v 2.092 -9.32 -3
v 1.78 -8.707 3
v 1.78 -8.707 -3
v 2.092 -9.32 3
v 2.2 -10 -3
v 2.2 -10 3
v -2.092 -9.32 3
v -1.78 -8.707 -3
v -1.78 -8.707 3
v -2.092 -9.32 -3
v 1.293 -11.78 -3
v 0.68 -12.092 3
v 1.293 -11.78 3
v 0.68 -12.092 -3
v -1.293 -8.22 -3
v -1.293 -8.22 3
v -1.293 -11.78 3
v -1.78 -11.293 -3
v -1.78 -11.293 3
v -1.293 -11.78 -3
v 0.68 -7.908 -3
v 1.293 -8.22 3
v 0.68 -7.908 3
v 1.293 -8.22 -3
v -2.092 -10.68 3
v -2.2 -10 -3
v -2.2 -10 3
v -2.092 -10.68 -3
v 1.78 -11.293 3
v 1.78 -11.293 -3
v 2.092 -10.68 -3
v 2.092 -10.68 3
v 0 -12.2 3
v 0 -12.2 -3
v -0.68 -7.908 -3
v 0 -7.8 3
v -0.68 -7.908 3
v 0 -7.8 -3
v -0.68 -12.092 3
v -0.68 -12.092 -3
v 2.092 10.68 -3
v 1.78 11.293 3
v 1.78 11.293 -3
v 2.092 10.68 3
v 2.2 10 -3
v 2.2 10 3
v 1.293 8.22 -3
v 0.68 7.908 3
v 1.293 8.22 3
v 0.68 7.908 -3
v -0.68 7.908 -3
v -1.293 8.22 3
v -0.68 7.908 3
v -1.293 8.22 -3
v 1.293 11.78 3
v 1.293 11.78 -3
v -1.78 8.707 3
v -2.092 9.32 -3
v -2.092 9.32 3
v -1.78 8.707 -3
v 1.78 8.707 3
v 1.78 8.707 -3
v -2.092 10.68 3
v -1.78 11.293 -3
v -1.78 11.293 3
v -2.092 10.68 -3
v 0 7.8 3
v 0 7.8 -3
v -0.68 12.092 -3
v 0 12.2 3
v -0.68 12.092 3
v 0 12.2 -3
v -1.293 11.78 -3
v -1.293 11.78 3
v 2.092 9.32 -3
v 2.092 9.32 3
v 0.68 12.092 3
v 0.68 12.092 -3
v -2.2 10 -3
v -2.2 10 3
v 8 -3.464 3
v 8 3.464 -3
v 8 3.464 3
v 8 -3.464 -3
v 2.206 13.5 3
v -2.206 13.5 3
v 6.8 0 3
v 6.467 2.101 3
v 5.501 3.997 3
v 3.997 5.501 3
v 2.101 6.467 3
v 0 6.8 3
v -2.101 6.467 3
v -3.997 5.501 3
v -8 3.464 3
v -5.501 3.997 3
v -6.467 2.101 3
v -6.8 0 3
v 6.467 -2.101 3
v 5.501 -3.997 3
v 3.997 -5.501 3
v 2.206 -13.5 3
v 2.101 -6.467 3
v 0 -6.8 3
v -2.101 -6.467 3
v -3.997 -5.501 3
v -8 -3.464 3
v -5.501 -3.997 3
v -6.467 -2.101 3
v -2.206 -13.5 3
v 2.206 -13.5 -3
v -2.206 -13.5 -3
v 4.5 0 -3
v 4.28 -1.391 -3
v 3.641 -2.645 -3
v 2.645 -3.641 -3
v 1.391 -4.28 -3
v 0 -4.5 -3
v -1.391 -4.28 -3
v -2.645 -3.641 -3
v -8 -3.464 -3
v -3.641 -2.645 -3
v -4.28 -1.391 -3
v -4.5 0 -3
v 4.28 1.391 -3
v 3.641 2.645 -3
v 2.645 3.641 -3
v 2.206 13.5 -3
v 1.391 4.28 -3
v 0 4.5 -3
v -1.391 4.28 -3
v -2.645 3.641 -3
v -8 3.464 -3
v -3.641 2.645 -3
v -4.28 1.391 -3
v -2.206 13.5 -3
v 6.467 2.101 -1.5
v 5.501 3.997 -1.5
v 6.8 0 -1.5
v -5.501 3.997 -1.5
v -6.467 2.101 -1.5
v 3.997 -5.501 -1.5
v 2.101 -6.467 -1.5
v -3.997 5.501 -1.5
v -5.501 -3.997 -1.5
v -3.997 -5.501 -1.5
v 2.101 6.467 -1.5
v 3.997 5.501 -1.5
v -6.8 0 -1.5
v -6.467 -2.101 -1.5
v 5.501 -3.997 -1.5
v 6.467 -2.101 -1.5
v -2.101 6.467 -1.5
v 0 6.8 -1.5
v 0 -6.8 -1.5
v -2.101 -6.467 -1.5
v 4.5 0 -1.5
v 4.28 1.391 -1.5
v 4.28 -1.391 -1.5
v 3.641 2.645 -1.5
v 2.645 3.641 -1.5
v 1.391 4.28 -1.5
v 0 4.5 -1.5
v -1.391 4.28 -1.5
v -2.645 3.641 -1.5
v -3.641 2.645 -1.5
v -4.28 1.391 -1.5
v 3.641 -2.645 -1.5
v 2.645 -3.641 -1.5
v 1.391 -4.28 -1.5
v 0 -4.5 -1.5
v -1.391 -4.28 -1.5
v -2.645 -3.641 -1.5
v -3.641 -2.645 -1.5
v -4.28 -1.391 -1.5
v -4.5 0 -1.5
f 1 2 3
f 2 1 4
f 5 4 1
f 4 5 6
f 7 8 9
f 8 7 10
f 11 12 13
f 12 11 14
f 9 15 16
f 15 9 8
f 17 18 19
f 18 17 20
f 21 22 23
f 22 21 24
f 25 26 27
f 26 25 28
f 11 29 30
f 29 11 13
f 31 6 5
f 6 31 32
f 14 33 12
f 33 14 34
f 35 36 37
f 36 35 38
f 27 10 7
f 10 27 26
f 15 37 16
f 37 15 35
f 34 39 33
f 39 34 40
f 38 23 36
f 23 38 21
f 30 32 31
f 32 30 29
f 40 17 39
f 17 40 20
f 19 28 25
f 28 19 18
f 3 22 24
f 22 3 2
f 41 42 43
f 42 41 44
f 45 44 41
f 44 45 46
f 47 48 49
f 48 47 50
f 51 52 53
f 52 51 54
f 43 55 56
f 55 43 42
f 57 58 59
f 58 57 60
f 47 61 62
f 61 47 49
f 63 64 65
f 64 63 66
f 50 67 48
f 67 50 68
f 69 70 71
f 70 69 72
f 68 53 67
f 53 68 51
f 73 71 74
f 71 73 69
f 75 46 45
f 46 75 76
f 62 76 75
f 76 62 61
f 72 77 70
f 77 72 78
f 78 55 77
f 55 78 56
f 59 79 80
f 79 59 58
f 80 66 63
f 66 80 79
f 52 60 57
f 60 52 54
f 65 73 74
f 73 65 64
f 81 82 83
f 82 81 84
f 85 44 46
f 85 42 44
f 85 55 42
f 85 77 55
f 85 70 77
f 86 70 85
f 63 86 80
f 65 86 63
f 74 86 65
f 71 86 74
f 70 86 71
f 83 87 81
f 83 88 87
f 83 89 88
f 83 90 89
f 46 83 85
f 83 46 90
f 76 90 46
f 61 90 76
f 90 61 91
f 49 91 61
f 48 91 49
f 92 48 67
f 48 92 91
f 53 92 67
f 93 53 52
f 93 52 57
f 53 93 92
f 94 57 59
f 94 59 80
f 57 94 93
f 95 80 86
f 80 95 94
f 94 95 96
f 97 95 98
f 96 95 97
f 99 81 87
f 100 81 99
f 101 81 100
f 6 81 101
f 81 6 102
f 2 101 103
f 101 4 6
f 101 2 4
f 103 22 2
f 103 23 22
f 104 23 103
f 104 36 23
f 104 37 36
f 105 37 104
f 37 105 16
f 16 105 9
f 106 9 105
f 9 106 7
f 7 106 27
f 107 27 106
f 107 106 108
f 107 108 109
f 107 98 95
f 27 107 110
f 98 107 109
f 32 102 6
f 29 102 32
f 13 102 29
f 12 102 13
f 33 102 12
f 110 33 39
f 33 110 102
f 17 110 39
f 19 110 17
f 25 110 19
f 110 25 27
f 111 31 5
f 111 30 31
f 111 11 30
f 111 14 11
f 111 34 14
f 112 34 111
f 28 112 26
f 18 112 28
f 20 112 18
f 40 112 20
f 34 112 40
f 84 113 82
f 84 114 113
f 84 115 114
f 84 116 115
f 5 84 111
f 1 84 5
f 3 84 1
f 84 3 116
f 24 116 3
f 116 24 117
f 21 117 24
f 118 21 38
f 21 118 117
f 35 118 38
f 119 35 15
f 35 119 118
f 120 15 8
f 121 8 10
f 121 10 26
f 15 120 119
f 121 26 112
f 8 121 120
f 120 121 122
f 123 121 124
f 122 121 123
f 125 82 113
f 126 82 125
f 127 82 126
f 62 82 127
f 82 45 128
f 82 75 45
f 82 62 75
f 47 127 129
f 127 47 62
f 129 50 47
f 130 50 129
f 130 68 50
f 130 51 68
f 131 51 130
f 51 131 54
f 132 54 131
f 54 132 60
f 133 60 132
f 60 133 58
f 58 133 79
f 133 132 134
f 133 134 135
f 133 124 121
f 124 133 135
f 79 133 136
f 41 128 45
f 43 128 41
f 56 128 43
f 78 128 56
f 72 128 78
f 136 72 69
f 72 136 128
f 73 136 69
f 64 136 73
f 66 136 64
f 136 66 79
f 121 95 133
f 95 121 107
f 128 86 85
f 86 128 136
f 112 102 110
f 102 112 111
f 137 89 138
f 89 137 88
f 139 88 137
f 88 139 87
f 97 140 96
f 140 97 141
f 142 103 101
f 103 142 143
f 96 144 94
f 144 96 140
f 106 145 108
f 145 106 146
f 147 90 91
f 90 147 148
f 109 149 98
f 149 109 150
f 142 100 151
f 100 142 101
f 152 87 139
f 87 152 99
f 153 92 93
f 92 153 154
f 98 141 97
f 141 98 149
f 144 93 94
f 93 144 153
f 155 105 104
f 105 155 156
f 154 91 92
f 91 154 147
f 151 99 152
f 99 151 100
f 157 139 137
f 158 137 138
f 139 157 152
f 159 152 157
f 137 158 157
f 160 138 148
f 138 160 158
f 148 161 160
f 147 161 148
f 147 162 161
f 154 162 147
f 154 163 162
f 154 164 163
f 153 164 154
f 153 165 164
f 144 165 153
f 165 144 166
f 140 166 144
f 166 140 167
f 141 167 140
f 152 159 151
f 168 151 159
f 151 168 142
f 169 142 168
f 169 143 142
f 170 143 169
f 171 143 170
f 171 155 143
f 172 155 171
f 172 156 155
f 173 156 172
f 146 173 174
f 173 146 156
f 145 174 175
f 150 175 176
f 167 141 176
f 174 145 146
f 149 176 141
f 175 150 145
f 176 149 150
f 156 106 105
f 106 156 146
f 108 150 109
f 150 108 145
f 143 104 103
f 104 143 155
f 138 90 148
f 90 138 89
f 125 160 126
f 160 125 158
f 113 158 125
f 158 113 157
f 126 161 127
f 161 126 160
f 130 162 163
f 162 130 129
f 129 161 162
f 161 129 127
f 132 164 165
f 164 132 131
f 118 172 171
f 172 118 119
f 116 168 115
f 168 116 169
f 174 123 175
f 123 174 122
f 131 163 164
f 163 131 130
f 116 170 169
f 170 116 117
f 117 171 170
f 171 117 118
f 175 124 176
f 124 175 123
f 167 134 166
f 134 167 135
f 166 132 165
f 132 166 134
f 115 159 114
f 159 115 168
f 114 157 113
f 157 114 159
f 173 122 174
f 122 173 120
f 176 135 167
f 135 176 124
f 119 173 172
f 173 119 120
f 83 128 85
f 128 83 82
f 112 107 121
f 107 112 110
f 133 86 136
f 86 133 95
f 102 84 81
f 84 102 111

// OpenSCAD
// holder for M4 bearing with 3x3 plate
$fn = 20;
d_o = 13.0 + 0.6;
d_o1 = 9;
r_ho = 2.2;

z_b = 5;
z_1 = 1.0;
z_a = z_b + z_1;

x_1 = 16;

y_1 = 27;

step_xy = 10;

module m_hole( i, j )
{
  translate([ i*step_xy, j*step_xy,z_1])  cylinder(h=2*z_a, r = r_ho, center = true );
}

module bearing_box()
{
  difference() {
    cube([x_1,y_1,z_a], true );
    translate([0,0,z_1])
      cylinder(h=z_b, r = d_o/2.0, center = true );
    translate([0,0,z_1])
      cylinder(h=2*z_a, r = d_o1/2.0, center = true );
    for( j=[-1:1:1]) {
      m_hole( 0, j );
    }
    translate([10,10,0]) rotate([0,0,30]) cube([10,15,z_a], center=true );
    translate([-10,-10,0]) rotate([0,0,30]) cube([10,15,z_a], center=true );
    translate([-10,10,0]) rotate([0,0,-30]) cube([10,15,z_a], center=true );
    translate([10,-10,0]) rotate([0,0,-30]) cube([10,15,z_a], center=true );
  }
  
}

bearing_box();
